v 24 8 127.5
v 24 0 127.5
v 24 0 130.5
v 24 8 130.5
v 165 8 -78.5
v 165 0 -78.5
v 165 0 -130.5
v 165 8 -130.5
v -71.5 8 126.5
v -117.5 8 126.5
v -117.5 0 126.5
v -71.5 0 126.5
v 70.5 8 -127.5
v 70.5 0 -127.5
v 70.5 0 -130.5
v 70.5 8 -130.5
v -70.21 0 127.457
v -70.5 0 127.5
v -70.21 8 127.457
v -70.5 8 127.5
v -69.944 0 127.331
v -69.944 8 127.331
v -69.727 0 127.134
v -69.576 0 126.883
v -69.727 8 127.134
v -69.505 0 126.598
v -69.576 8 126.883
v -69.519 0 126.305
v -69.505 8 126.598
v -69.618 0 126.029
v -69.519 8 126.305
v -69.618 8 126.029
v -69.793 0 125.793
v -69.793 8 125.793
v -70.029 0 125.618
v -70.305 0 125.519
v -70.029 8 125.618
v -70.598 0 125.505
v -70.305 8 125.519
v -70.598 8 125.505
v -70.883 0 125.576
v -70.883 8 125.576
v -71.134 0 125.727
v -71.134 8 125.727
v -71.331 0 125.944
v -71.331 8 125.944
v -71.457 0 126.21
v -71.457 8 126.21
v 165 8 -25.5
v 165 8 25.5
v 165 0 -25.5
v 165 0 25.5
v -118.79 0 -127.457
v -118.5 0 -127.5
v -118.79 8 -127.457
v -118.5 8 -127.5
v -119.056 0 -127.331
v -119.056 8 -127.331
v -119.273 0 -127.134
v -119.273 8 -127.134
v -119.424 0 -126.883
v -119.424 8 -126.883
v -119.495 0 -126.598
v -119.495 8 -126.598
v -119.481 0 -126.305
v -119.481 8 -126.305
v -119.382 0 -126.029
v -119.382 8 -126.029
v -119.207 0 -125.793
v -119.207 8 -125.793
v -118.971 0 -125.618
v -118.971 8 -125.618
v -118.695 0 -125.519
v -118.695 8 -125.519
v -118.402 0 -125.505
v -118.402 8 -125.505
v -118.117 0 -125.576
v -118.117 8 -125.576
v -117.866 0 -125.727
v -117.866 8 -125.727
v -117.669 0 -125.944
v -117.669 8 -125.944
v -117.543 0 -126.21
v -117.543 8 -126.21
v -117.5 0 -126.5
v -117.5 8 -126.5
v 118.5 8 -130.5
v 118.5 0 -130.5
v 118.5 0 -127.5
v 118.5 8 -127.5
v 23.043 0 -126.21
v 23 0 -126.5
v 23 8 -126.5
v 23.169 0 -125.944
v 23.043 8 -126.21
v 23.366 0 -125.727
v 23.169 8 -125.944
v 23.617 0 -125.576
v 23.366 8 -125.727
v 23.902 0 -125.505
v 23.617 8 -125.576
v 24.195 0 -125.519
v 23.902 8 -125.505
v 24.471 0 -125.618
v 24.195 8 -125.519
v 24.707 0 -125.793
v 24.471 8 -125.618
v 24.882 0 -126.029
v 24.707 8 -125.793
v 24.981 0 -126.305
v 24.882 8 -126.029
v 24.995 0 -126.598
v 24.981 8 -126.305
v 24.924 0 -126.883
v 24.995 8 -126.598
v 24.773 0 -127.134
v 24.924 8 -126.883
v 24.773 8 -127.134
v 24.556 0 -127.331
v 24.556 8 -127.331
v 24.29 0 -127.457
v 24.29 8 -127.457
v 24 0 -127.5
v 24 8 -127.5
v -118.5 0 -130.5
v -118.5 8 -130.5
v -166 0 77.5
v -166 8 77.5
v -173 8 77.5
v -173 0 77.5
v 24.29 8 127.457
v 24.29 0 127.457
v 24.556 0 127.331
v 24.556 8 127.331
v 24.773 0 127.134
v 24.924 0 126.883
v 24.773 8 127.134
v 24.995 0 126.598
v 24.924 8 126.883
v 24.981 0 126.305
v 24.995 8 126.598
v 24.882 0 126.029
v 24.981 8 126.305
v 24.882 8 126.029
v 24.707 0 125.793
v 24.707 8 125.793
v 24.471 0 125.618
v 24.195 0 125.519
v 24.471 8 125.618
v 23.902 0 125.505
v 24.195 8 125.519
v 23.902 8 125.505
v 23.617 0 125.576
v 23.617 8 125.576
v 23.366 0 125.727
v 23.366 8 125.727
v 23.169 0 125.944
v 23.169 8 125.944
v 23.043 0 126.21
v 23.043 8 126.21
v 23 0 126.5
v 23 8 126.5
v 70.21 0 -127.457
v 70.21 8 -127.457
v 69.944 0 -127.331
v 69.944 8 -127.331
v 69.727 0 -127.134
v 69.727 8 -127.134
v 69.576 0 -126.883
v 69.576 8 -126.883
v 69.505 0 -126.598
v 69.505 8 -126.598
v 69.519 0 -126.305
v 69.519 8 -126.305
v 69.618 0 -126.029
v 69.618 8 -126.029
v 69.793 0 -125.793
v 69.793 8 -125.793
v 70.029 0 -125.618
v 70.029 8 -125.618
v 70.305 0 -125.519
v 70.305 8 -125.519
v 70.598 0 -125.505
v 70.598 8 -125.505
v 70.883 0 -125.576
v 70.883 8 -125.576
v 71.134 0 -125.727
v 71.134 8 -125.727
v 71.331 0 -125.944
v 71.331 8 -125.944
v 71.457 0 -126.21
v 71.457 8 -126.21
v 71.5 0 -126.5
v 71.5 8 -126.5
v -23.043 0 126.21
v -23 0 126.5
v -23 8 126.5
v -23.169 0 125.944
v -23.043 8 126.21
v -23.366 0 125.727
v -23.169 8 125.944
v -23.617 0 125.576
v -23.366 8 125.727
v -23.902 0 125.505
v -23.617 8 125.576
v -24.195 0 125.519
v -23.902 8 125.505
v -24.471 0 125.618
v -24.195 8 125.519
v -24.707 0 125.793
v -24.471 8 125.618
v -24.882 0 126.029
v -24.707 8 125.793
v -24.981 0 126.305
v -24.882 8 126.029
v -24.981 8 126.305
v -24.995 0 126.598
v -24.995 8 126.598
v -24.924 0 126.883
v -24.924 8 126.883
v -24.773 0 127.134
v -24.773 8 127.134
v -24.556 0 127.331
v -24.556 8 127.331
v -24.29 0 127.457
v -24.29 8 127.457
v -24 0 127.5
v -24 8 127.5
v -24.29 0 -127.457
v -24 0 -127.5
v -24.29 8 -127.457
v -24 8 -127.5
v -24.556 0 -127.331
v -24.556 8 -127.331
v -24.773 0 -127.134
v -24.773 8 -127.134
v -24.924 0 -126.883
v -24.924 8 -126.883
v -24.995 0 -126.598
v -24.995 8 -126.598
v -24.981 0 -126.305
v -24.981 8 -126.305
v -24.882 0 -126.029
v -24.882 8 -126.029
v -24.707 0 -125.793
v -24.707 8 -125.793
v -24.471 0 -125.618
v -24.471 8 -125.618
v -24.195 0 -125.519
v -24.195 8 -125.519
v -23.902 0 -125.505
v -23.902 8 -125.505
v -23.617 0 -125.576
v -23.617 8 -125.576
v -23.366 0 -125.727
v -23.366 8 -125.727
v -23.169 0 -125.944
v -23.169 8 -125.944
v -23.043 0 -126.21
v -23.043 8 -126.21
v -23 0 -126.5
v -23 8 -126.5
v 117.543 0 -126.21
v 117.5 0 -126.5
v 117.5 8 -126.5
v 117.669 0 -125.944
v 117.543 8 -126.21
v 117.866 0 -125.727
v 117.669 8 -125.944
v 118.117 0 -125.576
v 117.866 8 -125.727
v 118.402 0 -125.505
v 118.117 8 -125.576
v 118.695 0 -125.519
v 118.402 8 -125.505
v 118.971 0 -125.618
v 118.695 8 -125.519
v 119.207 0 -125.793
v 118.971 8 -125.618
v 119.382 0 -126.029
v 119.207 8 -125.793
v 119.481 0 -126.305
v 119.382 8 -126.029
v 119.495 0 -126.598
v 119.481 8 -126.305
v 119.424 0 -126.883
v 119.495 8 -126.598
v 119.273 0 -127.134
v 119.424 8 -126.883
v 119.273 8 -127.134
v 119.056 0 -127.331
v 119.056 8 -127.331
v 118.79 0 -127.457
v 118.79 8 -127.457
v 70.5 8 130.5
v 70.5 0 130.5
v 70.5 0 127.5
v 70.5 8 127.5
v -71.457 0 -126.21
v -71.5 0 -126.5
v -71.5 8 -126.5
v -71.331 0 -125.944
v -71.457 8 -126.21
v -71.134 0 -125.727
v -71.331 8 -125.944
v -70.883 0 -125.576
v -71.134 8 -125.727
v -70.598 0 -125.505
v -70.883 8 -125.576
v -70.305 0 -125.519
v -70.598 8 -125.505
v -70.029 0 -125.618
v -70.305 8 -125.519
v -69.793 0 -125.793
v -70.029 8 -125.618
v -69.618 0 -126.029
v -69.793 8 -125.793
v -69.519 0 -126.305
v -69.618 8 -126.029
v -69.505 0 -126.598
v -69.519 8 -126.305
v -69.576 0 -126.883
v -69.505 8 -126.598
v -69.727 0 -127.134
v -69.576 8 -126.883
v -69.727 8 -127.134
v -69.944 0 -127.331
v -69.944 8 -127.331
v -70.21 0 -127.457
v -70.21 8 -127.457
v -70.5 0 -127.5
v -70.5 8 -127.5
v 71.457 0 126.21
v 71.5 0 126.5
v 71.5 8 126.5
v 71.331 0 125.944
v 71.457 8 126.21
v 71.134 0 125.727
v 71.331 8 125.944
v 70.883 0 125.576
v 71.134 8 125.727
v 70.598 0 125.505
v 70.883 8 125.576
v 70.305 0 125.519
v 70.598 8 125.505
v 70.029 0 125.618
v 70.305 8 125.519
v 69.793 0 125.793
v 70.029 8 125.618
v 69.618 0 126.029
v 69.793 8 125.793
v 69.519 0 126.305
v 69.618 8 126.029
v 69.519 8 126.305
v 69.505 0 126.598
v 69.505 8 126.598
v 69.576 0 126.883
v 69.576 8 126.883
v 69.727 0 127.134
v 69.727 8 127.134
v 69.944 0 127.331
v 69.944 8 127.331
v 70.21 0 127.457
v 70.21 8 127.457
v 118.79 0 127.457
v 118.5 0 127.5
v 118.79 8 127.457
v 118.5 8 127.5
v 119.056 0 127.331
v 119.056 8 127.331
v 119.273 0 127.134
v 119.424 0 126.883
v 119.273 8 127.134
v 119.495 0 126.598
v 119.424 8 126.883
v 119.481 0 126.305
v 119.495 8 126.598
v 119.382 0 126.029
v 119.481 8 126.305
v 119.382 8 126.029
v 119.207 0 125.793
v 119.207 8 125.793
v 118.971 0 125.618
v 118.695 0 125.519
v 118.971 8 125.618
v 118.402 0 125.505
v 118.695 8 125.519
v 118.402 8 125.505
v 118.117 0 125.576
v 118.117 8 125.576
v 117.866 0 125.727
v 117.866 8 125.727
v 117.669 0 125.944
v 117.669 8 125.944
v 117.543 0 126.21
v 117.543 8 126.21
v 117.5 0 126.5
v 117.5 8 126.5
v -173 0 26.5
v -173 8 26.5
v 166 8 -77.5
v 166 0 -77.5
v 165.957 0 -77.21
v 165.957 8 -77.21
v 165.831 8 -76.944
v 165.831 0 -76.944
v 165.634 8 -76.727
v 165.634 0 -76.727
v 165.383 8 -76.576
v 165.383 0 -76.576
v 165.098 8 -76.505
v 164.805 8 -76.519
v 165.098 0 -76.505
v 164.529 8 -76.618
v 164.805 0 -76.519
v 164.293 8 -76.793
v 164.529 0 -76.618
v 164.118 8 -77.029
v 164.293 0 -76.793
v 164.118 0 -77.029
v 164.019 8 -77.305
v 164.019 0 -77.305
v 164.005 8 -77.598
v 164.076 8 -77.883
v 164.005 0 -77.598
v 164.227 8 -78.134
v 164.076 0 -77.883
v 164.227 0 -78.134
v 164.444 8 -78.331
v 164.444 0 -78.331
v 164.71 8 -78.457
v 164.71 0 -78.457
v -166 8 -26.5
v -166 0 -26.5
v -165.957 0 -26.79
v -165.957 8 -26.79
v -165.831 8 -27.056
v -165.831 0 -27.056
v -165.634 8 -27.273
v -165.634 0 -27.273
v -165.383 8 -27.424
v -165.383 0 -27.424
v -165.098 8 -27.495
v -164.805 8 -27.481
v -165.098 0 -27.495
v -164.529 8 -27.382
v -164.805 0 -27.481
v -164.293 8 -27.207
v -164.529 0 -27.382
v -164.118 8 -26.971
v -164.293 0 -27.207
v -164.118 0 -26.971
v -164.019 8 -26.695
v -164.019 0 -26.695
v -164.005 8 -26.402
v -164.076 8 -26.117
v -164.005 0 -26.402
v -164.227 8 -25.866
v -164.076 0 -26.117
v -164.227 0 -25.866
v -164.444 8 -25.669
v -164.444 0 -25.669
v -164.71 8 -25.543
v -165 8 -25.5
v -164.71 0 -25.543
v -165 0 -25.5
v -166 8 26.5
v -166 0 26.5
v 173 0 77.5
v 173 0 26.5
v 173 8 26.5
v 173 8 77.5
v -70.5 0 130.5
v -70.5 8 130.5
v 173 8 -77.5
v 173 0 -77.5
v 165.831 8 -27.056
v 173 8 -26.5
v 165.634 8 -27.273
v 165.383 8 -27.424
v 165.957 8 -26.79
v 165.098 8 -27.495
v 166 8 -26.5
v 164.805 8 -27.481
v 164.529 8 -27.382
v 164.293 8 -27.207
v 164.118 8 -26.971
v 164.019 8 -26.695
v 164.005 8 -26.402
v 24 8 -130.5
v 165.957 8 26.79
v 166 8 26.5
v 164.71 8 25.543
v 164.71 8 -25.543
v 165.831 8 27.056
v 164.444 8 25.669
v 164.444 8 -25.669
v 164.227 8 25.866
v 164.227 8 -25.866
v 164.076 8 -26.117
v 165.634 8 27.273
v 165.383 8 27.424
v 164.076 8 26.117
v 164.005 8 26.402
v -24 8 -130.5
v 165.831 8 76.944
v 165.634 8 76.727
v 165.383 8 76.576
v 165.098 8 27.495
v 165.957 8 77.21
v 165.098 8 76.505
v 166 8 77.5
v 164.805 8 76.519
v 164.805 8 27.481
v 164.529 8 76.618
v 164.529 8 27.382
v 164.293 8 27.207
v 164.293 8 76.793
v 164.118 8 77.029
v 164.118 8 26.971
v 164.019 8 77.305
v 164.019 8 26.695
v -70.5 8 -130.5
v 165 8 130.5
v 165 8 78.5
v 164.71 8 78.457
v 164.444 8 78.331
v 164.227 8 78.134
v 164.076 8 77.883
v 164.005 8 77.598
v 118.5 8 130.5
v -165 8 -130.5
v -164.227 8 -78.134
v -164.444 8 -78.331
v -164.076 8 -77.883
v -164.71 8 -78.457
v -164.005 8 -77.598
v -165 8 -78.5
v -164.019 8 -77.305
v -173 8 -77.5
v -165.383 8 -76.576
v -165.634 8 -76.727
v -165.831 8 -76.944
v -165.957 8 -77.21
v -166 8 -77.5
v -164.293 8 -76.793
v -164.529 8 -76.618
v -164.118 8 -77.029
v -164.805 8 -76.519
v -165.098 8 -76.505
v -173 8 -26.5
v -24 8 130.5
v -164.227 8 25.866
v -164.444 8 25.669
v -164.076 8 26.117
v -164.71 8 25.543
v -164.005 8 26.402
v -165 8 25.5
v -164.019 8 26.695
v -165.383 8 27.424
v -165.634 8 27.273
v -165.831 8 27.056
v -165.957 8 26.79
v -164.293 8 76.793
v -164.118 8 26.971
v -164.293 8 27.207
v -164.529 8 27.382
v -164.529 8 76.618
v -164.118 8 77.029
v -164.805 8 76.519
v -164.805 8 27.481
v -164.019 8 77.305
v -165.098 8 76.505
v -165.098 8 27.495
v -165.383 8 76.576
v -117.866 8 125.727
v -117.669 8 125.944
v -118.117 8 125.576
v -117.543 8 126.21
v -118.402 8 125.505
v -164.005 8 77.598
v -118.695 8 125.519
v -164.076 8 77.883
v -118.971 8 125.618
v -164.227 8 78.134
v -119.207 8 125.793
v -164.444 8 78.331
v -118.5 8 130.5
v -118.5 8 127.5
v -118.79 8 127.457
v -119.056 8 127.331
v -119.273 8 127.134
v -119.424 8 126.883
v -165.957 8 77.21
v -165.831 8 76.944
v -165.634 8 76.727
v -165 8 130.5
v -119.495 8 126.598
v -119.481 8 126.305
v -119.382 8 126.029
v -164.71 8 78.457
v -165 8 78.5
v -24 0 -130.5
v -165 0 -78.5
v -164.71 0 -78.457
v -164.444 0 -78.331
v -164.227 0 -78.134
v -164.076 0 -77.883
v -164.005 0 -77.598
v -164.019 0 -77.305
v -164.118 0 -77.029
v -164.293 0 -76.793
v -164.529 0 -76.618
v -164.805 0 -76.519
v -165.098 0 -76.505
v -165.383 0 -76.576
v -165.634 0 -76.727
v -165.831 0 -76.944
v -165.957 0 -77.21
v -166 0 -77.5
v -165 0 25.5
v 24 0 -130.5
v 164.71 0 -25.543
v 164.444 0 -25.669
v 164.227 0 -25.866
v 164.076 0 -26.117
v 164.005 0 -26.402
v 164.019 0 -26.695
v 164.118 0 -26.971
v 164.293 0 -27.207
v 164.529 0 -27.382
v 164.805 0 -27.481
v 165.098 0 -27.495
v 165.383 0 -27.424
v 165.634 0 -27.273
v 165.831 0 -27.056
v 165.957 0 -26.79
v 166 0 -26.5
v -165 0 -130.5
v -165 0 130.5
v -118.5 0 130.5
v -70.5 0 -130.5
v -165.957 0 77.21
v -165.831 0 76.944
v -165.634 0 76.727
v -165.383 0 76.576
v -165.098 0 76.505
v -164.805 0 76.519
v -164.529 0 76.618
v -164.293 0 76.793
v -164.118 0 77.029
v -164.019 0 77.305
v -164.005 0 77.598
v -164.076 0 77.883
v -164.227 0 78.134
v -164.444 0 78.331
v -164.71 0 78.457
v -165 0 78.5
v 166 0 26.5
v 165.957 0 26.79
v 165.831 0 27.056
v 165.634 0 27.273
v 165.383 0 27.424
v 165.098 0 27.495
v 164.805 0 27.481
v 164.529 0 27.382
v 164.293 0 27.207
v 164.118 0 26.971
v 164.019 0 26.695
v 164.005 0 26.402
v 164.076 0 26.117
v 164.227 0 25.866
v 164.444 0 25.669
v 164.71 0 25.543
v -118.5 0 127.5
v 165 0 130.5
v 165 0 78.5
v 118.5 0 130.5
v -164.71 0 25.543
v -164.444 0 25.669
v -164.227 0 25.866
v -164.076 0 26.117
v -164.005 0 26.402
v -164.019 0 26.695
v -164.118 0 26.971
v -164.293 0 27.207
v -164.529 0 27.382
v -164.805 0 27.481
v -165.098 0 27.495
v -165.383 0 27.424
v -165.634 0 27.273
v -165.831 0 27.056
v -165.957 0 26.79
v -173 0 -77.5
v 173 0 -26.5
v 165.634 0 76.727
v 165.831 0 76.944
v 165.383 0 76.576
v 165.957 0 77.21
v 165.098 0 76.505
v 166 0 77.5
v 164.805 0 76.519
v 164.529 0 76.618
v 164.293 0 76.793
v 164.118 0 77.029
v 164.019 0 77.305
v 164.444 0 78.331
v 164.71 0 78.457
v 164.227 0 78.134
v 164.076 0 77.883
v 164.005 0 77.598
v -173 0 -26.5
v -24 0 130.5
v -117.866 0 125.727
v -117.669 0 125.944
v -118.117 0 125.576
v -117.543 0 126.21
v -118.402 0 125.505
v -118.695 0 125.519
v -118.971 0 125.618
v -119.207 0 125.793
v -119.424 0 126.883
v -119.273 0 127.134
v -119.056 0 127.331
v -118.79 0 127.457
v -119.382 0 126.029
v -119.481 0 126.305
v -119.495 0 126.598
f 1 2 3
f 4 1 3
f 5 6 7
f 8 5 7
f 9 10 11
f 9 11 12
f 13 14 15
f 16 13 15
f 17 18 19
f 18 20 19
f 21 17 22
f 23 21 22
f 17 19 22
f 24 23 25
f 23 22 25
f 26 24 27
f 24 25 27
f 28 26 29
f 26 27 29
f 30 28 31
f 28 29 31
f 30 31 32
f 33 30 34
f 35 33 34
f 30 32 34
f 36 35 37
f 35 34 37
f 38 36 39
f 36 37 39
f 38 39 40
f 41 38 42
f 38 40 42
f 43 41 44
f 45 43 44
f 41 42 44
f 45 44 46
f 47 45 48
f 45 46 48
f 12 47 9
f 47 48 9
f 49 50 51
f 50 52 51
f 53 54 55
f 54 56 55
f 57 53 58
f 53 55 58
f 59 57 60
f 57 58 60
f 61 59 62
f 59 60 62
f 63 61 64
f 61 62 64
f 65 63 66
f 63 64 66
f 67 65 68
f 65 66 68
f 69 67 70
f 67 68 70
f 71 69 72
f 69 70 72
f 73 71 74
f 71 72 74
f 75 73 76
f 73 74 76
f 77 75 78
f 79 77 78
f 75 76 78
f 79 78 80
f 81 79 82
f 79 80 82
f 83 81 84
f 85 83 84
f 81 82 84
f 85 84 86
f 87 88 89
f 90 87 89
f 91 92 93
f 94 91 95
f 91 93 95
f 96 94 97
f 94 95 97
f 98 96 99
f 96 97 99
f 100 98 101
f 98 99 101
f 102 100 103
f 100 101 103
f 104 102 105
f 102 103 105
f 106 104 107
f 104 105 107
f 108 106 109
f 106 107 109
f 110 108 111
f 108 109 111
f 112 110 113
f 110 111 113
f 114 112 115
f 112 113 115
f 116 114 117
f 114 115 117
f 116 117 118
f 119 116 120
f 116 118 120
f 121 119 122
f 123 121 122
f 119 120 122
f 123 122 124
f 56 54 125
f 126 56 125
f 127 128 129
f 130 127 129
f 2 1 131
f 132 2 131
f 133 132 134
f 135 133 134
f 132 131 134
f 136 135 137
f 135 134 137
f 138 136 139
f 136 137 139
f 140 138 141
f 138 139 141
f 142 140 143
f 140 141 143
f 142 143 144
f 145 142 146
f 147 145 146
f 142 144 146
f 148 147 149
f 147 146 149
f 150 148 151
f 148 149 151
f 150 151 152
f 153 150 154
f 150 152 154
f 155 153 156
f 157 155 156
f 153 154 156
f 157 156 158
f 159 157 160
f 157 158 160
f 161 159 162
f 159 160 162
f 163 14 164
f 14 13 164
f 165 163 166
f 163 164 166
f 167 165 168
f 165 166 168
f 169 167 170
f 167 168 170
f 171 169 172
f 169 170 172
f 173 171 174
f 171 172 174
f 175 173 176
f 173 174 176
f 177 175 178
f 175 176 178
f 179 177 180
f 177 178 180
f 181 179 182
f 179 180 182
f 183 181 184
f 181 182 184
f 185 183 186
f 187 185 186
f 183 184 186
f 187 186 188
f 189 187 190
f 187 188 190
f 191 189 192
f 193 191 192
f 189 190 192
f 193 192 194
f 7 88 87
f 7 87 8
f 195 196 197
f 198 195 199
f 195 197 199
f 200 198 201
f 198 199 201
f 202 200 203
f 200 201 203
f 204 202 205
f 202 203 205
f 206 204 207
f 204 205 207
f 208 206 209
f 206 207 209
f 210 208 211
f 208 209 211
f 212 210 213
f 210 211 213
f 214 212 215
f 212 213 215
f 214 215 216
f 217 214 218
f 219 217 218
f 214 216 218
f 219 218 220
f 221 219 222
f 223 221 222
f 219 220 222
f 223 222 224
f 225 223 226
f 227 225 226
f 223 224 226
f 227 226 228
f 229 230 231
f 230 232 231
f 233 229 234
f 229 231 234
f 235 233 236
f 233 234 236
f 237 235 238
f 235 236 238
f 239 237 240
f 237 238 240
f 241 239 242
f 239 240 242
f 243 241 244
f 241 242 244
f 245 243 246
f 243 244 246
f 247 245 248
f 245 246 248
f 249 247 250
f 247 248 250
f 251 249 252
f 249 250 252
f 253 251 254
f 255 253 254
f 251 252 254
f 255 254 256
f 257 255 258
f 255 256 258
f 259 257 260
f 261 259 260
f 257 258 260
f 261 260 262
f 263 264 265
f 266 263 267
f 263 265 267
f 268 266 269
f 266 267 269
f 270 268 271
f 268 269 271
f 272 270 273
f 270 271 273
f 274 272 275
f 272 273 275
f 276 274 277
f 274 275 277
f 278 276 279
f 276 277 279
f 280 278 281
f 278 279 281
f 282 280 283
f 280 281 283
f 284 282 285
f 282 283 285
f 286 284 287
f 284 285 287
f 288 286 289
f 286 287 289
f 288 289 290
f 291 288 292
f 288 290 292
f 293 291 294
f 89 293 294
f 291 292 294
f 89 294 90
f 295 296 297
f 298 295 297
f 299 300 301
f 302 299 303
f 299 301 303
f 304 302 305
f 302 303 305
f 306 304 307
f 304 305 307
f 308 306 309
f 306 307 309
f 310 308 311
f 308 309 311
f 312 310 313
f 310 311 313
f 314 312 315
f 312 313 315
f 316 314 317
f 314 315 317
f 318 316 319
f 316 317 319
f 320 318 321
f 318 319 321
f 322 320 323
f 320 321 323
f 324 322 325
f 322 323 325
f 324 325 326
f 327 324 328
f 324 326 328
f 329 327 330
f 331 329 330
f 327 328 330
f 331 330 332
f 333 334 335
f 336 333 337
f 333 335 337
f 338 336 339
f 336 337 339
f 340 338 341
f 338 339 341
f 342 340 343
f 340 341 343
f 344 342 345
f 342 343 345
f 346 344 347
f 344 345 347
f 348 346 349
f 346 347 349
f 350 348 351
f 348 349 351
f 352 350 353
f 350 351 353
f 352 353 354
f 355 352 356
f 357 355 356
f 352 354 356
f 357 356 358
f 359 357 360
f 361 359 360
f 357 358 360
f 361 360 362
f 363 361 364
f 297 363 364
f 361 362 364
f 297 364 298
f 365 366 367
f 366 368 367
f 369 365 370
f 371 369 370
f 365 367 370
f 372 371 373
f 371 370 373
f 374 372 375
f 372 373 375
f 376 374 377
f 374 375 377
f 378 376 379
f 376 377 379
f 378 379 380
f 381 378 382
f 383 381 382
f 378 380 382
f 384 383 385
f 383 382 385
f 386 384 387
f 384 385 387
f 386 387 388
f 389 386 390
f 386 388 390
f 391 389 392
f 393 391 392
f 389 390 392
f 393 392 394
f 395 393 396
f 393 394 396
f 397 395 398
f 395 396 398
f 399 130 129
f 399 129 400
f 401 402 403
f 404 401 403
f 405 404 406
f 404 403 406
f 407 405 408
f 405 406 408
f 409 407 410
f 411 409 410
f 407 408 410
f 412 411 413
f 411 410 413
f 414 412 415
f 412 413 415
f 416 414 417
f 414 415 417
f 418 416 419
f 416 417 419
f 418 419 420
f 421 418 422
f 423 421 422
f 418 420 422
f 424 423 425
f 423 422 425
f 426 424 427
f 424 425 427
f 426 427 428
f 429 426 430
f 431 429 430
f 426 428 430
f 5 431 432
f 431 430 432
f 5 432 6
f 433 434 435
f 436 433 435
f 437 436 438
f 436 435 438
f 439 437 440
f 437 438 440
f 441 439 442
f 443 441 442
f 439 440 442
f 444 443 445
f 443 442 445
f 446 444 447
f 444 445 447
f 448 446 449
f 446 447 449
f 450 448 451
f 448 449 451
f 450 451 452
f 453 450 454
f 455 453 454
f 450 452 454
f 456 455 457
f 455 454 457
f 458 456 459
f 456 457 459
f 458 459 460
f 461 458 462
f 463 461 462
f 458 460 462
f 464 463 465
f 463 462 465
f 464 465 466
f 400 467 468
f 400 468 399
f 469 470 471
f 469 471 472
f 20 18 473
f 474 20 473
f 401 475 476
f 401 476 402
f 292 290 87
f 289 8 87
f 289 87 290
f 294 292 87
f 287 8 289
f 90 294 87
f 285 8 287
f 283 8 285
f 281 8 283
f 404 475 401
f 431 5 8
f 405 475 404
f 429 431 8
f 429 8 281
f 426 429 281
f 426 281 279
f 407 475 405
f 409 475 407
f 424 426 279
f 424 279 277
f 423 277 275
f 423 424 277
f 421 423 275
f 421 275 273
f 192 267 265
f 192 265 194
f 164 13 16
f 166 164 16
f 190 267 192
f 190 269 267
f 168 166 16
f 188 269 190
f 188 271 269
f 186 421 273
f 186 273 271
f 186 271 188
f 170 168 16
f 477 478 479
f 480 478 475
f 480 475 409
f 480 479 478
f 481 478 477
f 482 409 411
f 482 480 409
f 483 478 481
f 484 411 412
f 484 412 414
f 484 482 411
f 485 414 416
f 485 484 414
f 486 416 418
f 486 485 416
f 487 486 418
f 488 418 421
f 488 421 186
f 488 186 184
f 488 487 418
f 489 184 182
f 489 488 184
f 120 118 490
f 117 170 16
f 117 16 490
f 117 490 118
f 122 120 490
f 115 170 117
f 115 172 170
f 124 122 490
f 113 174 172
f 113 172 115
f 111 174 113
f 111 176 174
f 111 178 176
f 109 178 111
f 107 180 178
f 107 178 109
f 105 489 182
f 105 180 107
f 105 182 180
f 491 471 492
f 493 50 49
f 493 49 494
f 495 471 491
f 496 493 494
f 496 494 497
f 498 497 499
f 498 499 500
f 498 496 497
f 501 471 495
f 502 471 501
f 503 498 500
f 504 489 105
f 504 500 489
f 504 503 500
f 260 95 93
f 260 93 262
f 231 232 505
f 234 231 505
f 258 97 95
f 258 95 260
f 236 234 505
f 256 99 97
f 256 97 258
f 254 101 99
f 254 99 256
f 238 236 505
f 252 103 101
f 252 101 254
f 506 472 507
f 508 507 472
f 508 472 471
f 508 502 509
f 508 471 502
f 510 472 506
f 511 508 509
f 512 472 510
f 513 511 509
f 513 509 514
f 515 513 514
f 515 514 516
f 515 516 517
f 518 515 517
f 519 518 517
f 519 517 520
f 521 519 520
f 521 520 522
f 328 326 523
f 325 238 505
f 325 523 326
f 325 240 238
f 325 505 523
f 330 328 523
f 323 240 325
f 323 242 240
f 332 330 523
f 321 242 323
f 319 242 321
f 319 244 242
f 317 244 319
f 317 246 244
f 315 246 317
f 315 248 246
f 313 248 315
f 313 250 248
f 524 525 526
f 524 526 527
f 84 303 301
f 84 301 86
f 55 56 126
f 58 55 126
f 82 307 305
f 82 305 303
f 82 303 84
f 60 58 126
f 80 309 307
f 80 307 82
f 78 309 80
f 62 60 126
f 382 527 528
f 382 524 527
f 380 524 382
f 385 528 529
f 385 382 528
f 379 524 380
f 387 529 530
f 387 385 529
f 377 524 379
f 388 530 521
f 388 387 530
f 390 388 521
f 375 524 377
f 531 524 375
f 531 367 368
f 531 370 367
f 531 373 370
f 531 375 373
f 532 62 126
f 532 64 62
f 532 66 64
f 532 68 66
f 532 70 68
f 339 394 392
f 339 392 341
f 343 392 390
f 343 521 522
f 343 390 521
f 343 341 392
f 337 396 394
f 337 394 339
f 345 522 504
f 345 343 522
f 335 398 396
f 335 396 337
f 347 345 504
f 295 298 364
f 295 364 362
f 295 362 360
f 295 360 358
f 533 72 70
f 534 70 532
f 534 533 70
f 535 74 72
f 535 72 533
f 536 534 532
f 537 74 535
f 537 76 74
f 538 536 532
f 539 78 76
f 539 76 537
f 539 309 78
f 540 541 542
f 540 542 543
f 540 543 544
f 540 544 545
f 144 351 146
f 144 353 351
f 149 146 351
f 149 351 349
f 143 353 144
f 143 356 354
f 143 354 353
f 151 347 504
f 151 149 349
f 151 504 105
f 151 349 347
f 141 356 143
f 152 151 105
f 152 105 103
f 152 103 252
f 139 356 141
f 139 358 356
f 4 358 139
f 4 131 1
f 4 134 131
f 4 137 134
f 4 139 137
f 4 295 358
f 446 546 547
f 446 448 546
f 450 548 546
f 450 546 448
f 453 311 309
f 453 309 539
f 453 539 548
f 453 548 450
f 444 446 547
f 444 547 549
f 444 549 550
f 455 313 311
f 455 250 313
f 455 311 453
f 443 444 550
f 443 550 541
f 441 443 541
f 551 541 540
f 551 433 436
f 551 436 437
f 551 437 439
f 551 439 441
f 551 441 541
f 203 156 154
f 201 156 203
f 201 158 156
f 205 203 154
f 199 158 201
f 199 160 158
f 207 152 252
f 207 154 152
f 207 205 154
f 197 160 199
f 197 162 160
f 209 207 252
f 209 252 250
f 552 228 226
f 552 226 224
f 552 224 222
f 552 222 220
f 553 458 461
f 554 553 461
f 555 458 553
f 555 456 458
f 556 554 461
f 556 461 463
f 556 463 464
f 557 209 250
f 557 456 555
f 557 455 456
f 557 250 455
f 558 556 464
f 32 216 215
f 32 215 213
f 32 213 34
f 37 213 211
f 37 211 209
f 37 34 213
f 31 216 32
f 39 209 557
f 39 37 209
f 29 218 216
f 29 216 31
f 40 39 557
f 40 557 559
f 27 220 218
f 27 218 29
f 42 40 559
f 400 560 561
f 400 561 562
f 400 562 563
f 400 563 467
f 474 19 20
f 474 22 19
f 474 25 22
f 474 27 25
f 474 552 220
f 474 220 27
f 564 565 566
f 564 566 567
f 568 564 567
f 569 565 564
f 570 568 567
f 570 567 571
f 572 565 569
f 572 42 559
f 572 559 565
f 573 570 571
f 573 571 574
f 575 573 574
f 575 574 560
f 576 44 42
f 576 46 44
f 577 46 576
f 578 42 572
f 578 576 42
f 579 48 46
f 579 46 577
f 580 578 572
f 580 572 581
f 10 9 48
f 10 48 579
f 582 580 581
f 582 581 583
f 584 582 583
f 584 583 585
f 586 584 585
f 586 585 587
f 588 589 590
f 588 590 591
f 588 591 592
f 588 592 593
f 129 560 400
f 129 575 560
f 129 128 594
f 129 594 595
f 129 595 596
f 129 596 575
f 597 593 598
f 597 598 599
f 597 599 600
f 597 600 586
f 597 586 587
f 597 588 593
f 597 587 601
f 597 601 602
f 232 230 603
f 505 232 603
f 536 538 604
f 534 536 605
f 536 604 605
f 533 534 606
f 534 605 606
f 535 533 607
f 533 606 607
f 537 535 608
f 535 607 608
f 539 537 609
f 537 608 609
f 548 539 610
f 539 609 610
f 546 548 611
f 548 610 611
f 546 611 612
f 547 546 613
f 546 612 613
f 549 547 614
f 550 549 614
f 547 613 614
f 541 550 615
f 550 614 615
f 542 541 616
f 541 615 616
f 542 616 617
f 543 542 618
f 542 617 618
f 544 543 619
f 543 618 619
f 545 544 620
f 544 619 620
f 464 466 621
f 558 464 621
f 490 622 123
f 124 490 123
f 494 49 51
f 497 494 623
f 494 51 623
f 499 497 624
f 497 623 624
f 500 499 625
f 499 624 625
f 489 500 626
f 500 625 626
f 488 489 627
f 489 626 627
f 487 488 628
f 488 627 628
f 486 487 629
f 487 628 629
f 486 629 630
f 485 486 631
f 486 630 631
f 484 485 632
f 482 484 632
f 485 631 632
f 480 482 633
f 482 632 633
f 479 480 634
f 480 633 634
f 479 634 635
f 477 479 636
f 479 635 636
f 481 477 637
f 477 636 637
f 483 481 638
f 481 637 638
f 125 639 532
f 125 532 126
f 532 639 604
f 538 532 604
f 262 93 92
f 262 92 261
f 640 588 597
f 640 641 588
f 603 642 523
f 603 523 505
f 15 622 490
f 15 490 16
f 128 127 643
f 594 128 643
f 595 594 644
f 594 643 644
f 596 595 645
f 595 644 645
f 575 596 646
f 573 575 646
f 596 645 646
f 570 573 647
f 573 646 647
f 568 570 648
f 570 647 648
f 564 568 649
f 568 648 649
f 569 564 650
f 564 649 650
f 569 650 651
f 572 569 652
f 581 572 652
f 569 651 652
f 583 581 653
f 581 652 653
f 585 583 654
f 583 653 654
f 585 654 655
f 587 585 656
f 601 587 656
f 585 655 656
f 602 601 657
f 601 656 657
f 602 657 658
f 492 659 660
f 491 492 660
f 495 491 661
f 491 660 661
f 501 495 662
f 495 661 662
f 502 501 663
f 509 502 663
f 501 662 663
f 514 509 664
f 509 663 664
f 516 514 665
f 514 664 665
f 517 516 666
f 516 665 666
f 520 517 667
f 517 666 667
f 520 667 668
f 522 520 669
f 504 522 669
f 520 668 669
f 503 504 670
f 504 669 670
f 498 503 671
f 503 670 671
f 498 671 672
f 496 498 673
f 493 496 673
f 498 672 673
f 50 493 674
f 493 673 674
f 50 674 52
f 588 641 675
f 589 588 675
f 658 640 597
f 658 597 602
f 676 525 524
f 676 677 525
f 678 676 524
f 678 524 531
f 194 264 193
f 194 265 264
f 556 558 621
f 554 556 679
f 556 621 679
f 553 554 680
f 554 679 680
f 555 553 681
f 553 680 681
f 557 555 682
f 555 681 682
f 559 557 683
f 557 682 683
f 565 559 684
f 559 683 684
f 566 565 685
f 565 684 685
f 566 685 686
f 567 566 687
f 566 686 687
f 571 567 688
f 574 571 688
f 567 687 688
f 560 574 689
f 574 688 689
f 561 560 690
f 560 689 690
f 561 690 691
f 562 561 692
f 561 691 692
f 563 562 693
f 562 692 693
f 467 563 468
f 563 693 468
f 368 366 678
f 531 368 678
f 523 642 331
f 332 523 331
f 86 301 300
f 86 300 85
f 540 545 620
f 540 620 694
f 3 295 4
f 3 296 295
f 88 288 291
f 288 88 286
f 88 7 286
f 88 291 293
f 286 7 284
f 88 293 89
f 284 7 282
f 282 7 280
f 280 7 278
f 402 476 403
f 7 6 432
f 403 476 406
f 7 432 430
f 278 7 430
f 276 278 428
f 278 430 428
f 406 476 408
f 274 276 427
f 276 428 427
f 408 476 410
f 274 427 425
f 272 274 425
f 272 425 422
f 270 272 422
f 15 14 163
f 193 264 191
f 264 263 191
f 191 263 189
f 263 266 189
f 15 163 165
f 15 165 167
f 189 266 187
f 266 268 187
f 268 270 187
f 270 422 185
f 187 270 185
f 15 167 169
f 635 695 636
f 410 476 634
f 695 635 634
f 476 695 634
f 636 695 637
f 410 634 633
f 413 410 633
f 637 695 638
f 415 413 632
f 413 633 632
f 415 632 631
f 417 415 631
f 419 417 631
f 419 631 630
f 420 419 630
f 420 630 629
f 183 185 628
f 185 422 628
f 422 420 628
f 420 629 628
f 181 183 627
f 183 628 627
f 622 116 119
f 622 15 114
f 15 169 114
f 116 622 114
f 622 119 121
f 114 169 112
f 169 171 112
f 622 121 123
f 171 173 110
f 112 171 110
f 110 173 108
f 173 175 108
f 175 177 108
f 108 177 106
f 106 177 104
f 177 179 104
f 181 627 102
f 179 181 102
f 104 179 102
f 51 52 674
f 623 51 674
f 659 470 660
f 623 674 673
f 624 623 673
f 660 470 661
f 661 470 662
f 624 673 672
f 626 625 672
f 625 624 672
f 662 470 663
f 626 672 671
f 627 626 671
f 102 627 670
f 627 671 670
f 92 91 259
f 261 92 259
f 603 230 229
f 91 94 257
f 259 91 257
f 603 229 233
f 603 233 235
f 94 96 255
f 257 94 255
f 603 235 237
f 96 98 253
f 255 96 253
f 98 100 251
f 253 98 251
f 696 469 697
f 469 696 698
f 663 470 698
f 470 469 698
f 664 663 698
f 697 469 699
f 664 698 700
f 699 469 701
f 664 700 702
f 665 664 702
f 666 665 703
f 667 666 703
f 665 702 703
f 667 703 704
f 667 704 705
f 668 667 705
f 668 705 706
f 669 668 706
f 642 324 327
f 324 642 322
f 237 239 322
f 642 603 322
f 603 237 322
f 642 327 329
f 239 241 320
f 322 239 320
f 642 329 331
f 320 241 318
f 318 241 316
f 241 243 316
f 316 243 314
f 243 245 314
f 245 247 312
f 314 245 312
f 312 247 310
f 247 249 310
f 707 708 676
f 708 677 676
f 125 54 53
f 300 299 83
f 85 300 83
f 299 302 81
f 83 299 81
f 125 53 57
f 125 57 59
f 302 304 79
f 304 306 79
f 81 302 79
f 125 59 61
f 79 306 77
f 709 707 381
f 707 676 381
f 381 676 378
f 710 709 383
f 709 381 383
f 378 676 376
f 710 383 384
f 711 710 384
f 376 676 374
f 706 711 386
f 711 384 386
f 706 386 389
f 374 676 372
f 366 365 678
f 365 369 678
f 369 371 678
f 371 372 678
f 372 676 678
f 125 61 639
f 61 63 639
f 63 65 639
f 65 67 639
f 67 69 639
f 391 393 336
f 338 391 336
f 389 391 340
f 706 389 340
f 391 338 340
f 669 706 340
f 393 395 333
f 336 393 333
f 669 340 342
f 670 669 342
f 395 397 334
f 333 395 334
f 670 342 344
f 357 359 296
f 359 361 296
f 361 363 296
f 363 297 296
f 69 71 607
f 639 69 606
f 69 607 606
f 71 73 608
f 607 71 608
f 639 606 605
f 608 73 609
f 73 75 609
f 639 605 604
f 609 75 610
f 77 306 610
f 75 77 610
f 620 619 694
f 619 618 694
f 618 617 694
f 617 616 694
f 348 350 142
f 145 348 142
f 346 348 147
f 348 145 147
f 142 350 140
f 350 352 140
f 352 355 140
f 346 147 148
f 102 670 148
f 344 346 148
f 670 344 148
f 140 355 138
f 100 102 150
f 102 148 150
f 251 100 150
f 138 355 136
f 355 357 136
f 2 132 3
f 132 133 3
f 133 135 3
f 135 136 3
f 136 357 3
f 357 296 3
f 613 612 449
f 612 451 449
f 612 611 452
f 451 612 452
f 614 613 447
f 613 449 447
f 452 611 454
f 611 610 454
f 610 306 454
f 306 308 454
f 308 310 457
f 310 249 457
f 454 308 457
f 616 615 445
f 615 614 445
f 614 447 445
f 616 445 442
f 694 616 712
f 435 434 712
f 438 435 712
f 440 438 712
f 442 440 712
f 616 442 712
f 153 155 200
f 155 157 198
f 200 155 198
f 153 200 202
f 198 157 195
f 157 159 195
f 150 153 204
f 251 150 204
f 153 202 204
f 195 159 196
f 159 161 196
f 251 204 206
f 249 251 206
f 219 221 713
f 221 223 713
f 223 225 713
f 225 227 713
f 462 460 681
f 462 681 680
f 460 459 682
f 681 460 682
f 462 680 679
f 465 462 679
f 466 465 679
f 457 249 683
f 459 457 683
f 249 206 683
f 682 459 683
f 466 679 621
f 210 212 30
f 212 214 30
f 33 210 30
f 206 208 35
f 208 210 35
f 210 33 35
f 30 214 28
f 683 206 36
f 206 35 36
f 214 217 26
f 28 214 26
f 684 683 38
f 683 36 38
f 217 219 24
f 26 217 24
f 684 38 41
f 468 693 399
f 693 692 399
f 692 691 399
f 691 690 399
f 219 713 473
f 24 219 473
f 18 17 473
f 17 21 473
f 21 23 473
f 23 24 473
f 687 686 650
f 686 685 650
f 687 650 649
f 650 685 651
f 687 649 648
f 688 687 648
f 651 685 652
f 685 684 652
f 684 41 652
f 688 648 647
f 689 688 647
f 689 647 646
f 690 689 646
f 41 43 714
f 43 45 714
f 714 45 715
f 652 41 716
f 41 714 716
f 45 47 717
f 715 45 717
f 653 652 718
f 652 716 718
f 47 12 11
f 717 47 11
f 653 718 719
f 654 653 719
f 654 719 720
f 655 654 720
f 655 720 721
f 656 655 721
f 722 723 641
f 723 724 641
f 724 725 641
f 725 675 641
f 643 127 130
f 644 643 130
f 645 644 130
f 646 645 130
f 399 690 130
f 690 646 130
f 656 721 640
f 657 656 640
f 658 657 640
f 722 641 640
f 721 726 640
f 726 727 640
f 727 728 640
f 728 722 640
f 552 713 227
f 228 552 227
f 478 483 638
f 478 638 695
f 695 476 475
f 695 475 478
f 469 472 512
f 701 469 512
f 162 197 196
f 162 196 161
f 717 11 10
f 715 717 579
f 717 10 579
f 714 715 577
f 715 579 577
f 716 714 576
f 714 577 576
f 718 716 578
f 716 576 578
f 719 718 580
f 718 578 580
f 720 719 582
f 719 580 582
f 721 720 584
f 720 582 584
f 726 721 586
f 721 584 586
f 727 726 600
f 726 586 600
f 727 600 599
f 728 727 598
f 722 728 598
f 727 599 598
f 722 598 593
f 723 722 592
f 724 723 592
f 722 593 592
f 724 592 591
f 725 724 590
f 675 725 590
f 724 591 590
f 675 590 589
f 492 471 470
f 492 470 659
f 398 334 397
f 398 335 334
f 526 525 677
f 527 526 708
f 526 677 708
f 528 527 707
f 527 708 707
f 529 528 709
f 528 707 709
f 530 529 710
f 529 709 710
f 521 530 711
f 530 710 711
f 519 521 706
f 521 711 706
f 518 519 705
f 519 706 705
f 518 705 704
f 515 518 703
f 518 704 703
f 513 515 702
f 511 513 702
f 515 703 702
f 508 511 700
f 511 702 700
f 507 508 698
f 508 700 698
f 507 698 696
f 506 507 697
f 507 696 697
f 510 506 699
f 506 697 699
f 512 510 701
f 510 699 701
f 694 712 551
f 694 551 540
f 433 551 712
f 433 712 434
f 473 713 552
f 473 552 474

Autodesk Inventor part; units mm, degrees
ref_plane "YZ Plane" through (0, 0, 0) normal (1, 0, 0) x (0, 1, 0)
ref_plane "XZ Plane" through (0, 0, 0) normal (0, 1, 0) x (-1, 0, 0)
ref_plane "XY Plane" through (0, 0, 0) normal (0, 0, 1) x (1, 0, 0)
sketch "Sketch1" plane through (0, 0, 0) normal (0, 1, 0) x (-1, 0, 0)
  line L0 (173, -130.5) -> (-173, -130.5)
  line L1 (-173, -130.5) -> (-173, 130.5)
  line L2 (-173, 130.5) -> (173, 130.5)
  line L3 (173, 130.5) -> (173, -130.5)
  point P0 (0, 0)
  point P1 (173, 0)
  point P2 (0, -130.5)
  dimension "d0" = 346
  dimension "d1" = 261
extrude "Extrusion1" add sketch "Sketch1" along normal blind 8
sketch "Esboço2" plane through (0, 8, 0) normal (0, 1, 0) x (1, 0, 0)
  line L0 (173, 130.5) -> (-173, 130.5) projected
  line L1 (-118.5, 130.5) -> (-70.5, 130.5)
  line L2 (-70.5, 130.5) -> (-70.5, 126.5)
  line L3 (-70.5, 126.5) -> (-118.5, 126.5)
  line L4 (-118.5, 126.5) -> (-118.5, 130.5)
  line L5 (-173, 130.5) -> (-173, -130.5) projected
  line L6 (-24, 130.5) -> (24, 130.5)
  line L7 (24, 130.5) -> (24, 126.5)
  line L8 (24, 126.5) -> (-24, 126.5)
  line L9 (-24, 126.5) -> (-24, 130.5)
  line L10 (70.5, 130.5) -> (118.5, 130.5)
  line L11 (118.5, 130.5) -> (118.5, 126.5)
  line L12 (118.5, 126.5) -> (70.5, 126.5)
  line L13 (70.5, 126.5) -> (70.5, 130.5)
  line L14 (173, -130.5) -> (173, 130.5) projected
  circle A0 centre (-118.5, 126.5) radius 1
  circle A1 centre (-70.5, 126.5) radius 1
  circle A2 centre (-24, 126.5) radius 1
  circle A3 centre (24, 126.5) radius 1
  circle A4 centre (70.5, 126.5) radius 1
  circle A5 centre (118.5, 126.5) radius 1
  point P0 (0, 0)
  dimension "d4" = 48
  dimension "d5" = 4
  dimension "d6" = 54.5
  dimension "d7" = 48
  dimension "d8" = 4
  dimension "d9" = 46.5
  dimension "d10" = 4
  dimension "d11" = 48
  dimension "d12" = 46.5
  dimension "d13" = 54.5
  dimension "d14" = 2
  dimension "d15" = 2
  dimension "d16" = 2
  dimension "d17" = 2
extrude "Extrusão2" cut sketch "Esboço2" against normal blind 10
mirror "Espelhamento1" about plane through (0, 0, 0) normal (0, 0, 1) of "Extrusão2"
sketch "Esboço3" plane through (0, 0, 0) normal (0, -1, 0) x (1, 0, 0)
  line L0 (-173, 130.5) -> (-173, -130.5) projected
  line L1 (-173, 130.5) -> (-165, 130.5)
  line L2 (-165, 130.5) -> (-165, 77.5)
  line L3 (-165, 77.5) -> (-173, 77.5)
  line L4 (-173, 77.5) -> (-173, 130.5)
  line L5 (-165, 26.5) -> (-173, 26.5)
  line L6 (-173, 26.5) -> (-173, -26.5)
  line L7 (-173, -26.5) -> (-165, -26.5)
  line L8 (-165, -26.5) -> (-165, 26.5)
  line L9 (-173, -130.5) -> (-165, -130.5)
  line L10 (-165, -130.5) -> (-165, -77.5)
  line L11 (-165, -77.5) -> (-173, -77.5)
  line L12 (-173, -77.5) -> (-173, -130.5)
  circle A0 centre (-165, 77.5) radius 1
  circle A1 centre (-165, 26.5) radius 1
  circle A2 centre (-165, -26.5) radius 1
  circle A3 centre (-165, -77.5) radius 1
  point P0 (0, 0)
  dimension "d20" = 8
  dimension "d21" = 53
  dimension "d22" = 53
  dimension "d23" = 51
  dimension "d24" = 51
  dimension "d25" = 53
  dimension "d26" = 2
  dimension "d27" = 2
  dimension "d28" = 2
  dimension "d29" = 2
extrude "Extrusão3" cut sketch "Esboço3" against normal blind 10
mirror "Espelhamento2" about plane through (0, 0, 0) normal (1, 0, 0) of "Extrusão3"
properties part number "BASE"
